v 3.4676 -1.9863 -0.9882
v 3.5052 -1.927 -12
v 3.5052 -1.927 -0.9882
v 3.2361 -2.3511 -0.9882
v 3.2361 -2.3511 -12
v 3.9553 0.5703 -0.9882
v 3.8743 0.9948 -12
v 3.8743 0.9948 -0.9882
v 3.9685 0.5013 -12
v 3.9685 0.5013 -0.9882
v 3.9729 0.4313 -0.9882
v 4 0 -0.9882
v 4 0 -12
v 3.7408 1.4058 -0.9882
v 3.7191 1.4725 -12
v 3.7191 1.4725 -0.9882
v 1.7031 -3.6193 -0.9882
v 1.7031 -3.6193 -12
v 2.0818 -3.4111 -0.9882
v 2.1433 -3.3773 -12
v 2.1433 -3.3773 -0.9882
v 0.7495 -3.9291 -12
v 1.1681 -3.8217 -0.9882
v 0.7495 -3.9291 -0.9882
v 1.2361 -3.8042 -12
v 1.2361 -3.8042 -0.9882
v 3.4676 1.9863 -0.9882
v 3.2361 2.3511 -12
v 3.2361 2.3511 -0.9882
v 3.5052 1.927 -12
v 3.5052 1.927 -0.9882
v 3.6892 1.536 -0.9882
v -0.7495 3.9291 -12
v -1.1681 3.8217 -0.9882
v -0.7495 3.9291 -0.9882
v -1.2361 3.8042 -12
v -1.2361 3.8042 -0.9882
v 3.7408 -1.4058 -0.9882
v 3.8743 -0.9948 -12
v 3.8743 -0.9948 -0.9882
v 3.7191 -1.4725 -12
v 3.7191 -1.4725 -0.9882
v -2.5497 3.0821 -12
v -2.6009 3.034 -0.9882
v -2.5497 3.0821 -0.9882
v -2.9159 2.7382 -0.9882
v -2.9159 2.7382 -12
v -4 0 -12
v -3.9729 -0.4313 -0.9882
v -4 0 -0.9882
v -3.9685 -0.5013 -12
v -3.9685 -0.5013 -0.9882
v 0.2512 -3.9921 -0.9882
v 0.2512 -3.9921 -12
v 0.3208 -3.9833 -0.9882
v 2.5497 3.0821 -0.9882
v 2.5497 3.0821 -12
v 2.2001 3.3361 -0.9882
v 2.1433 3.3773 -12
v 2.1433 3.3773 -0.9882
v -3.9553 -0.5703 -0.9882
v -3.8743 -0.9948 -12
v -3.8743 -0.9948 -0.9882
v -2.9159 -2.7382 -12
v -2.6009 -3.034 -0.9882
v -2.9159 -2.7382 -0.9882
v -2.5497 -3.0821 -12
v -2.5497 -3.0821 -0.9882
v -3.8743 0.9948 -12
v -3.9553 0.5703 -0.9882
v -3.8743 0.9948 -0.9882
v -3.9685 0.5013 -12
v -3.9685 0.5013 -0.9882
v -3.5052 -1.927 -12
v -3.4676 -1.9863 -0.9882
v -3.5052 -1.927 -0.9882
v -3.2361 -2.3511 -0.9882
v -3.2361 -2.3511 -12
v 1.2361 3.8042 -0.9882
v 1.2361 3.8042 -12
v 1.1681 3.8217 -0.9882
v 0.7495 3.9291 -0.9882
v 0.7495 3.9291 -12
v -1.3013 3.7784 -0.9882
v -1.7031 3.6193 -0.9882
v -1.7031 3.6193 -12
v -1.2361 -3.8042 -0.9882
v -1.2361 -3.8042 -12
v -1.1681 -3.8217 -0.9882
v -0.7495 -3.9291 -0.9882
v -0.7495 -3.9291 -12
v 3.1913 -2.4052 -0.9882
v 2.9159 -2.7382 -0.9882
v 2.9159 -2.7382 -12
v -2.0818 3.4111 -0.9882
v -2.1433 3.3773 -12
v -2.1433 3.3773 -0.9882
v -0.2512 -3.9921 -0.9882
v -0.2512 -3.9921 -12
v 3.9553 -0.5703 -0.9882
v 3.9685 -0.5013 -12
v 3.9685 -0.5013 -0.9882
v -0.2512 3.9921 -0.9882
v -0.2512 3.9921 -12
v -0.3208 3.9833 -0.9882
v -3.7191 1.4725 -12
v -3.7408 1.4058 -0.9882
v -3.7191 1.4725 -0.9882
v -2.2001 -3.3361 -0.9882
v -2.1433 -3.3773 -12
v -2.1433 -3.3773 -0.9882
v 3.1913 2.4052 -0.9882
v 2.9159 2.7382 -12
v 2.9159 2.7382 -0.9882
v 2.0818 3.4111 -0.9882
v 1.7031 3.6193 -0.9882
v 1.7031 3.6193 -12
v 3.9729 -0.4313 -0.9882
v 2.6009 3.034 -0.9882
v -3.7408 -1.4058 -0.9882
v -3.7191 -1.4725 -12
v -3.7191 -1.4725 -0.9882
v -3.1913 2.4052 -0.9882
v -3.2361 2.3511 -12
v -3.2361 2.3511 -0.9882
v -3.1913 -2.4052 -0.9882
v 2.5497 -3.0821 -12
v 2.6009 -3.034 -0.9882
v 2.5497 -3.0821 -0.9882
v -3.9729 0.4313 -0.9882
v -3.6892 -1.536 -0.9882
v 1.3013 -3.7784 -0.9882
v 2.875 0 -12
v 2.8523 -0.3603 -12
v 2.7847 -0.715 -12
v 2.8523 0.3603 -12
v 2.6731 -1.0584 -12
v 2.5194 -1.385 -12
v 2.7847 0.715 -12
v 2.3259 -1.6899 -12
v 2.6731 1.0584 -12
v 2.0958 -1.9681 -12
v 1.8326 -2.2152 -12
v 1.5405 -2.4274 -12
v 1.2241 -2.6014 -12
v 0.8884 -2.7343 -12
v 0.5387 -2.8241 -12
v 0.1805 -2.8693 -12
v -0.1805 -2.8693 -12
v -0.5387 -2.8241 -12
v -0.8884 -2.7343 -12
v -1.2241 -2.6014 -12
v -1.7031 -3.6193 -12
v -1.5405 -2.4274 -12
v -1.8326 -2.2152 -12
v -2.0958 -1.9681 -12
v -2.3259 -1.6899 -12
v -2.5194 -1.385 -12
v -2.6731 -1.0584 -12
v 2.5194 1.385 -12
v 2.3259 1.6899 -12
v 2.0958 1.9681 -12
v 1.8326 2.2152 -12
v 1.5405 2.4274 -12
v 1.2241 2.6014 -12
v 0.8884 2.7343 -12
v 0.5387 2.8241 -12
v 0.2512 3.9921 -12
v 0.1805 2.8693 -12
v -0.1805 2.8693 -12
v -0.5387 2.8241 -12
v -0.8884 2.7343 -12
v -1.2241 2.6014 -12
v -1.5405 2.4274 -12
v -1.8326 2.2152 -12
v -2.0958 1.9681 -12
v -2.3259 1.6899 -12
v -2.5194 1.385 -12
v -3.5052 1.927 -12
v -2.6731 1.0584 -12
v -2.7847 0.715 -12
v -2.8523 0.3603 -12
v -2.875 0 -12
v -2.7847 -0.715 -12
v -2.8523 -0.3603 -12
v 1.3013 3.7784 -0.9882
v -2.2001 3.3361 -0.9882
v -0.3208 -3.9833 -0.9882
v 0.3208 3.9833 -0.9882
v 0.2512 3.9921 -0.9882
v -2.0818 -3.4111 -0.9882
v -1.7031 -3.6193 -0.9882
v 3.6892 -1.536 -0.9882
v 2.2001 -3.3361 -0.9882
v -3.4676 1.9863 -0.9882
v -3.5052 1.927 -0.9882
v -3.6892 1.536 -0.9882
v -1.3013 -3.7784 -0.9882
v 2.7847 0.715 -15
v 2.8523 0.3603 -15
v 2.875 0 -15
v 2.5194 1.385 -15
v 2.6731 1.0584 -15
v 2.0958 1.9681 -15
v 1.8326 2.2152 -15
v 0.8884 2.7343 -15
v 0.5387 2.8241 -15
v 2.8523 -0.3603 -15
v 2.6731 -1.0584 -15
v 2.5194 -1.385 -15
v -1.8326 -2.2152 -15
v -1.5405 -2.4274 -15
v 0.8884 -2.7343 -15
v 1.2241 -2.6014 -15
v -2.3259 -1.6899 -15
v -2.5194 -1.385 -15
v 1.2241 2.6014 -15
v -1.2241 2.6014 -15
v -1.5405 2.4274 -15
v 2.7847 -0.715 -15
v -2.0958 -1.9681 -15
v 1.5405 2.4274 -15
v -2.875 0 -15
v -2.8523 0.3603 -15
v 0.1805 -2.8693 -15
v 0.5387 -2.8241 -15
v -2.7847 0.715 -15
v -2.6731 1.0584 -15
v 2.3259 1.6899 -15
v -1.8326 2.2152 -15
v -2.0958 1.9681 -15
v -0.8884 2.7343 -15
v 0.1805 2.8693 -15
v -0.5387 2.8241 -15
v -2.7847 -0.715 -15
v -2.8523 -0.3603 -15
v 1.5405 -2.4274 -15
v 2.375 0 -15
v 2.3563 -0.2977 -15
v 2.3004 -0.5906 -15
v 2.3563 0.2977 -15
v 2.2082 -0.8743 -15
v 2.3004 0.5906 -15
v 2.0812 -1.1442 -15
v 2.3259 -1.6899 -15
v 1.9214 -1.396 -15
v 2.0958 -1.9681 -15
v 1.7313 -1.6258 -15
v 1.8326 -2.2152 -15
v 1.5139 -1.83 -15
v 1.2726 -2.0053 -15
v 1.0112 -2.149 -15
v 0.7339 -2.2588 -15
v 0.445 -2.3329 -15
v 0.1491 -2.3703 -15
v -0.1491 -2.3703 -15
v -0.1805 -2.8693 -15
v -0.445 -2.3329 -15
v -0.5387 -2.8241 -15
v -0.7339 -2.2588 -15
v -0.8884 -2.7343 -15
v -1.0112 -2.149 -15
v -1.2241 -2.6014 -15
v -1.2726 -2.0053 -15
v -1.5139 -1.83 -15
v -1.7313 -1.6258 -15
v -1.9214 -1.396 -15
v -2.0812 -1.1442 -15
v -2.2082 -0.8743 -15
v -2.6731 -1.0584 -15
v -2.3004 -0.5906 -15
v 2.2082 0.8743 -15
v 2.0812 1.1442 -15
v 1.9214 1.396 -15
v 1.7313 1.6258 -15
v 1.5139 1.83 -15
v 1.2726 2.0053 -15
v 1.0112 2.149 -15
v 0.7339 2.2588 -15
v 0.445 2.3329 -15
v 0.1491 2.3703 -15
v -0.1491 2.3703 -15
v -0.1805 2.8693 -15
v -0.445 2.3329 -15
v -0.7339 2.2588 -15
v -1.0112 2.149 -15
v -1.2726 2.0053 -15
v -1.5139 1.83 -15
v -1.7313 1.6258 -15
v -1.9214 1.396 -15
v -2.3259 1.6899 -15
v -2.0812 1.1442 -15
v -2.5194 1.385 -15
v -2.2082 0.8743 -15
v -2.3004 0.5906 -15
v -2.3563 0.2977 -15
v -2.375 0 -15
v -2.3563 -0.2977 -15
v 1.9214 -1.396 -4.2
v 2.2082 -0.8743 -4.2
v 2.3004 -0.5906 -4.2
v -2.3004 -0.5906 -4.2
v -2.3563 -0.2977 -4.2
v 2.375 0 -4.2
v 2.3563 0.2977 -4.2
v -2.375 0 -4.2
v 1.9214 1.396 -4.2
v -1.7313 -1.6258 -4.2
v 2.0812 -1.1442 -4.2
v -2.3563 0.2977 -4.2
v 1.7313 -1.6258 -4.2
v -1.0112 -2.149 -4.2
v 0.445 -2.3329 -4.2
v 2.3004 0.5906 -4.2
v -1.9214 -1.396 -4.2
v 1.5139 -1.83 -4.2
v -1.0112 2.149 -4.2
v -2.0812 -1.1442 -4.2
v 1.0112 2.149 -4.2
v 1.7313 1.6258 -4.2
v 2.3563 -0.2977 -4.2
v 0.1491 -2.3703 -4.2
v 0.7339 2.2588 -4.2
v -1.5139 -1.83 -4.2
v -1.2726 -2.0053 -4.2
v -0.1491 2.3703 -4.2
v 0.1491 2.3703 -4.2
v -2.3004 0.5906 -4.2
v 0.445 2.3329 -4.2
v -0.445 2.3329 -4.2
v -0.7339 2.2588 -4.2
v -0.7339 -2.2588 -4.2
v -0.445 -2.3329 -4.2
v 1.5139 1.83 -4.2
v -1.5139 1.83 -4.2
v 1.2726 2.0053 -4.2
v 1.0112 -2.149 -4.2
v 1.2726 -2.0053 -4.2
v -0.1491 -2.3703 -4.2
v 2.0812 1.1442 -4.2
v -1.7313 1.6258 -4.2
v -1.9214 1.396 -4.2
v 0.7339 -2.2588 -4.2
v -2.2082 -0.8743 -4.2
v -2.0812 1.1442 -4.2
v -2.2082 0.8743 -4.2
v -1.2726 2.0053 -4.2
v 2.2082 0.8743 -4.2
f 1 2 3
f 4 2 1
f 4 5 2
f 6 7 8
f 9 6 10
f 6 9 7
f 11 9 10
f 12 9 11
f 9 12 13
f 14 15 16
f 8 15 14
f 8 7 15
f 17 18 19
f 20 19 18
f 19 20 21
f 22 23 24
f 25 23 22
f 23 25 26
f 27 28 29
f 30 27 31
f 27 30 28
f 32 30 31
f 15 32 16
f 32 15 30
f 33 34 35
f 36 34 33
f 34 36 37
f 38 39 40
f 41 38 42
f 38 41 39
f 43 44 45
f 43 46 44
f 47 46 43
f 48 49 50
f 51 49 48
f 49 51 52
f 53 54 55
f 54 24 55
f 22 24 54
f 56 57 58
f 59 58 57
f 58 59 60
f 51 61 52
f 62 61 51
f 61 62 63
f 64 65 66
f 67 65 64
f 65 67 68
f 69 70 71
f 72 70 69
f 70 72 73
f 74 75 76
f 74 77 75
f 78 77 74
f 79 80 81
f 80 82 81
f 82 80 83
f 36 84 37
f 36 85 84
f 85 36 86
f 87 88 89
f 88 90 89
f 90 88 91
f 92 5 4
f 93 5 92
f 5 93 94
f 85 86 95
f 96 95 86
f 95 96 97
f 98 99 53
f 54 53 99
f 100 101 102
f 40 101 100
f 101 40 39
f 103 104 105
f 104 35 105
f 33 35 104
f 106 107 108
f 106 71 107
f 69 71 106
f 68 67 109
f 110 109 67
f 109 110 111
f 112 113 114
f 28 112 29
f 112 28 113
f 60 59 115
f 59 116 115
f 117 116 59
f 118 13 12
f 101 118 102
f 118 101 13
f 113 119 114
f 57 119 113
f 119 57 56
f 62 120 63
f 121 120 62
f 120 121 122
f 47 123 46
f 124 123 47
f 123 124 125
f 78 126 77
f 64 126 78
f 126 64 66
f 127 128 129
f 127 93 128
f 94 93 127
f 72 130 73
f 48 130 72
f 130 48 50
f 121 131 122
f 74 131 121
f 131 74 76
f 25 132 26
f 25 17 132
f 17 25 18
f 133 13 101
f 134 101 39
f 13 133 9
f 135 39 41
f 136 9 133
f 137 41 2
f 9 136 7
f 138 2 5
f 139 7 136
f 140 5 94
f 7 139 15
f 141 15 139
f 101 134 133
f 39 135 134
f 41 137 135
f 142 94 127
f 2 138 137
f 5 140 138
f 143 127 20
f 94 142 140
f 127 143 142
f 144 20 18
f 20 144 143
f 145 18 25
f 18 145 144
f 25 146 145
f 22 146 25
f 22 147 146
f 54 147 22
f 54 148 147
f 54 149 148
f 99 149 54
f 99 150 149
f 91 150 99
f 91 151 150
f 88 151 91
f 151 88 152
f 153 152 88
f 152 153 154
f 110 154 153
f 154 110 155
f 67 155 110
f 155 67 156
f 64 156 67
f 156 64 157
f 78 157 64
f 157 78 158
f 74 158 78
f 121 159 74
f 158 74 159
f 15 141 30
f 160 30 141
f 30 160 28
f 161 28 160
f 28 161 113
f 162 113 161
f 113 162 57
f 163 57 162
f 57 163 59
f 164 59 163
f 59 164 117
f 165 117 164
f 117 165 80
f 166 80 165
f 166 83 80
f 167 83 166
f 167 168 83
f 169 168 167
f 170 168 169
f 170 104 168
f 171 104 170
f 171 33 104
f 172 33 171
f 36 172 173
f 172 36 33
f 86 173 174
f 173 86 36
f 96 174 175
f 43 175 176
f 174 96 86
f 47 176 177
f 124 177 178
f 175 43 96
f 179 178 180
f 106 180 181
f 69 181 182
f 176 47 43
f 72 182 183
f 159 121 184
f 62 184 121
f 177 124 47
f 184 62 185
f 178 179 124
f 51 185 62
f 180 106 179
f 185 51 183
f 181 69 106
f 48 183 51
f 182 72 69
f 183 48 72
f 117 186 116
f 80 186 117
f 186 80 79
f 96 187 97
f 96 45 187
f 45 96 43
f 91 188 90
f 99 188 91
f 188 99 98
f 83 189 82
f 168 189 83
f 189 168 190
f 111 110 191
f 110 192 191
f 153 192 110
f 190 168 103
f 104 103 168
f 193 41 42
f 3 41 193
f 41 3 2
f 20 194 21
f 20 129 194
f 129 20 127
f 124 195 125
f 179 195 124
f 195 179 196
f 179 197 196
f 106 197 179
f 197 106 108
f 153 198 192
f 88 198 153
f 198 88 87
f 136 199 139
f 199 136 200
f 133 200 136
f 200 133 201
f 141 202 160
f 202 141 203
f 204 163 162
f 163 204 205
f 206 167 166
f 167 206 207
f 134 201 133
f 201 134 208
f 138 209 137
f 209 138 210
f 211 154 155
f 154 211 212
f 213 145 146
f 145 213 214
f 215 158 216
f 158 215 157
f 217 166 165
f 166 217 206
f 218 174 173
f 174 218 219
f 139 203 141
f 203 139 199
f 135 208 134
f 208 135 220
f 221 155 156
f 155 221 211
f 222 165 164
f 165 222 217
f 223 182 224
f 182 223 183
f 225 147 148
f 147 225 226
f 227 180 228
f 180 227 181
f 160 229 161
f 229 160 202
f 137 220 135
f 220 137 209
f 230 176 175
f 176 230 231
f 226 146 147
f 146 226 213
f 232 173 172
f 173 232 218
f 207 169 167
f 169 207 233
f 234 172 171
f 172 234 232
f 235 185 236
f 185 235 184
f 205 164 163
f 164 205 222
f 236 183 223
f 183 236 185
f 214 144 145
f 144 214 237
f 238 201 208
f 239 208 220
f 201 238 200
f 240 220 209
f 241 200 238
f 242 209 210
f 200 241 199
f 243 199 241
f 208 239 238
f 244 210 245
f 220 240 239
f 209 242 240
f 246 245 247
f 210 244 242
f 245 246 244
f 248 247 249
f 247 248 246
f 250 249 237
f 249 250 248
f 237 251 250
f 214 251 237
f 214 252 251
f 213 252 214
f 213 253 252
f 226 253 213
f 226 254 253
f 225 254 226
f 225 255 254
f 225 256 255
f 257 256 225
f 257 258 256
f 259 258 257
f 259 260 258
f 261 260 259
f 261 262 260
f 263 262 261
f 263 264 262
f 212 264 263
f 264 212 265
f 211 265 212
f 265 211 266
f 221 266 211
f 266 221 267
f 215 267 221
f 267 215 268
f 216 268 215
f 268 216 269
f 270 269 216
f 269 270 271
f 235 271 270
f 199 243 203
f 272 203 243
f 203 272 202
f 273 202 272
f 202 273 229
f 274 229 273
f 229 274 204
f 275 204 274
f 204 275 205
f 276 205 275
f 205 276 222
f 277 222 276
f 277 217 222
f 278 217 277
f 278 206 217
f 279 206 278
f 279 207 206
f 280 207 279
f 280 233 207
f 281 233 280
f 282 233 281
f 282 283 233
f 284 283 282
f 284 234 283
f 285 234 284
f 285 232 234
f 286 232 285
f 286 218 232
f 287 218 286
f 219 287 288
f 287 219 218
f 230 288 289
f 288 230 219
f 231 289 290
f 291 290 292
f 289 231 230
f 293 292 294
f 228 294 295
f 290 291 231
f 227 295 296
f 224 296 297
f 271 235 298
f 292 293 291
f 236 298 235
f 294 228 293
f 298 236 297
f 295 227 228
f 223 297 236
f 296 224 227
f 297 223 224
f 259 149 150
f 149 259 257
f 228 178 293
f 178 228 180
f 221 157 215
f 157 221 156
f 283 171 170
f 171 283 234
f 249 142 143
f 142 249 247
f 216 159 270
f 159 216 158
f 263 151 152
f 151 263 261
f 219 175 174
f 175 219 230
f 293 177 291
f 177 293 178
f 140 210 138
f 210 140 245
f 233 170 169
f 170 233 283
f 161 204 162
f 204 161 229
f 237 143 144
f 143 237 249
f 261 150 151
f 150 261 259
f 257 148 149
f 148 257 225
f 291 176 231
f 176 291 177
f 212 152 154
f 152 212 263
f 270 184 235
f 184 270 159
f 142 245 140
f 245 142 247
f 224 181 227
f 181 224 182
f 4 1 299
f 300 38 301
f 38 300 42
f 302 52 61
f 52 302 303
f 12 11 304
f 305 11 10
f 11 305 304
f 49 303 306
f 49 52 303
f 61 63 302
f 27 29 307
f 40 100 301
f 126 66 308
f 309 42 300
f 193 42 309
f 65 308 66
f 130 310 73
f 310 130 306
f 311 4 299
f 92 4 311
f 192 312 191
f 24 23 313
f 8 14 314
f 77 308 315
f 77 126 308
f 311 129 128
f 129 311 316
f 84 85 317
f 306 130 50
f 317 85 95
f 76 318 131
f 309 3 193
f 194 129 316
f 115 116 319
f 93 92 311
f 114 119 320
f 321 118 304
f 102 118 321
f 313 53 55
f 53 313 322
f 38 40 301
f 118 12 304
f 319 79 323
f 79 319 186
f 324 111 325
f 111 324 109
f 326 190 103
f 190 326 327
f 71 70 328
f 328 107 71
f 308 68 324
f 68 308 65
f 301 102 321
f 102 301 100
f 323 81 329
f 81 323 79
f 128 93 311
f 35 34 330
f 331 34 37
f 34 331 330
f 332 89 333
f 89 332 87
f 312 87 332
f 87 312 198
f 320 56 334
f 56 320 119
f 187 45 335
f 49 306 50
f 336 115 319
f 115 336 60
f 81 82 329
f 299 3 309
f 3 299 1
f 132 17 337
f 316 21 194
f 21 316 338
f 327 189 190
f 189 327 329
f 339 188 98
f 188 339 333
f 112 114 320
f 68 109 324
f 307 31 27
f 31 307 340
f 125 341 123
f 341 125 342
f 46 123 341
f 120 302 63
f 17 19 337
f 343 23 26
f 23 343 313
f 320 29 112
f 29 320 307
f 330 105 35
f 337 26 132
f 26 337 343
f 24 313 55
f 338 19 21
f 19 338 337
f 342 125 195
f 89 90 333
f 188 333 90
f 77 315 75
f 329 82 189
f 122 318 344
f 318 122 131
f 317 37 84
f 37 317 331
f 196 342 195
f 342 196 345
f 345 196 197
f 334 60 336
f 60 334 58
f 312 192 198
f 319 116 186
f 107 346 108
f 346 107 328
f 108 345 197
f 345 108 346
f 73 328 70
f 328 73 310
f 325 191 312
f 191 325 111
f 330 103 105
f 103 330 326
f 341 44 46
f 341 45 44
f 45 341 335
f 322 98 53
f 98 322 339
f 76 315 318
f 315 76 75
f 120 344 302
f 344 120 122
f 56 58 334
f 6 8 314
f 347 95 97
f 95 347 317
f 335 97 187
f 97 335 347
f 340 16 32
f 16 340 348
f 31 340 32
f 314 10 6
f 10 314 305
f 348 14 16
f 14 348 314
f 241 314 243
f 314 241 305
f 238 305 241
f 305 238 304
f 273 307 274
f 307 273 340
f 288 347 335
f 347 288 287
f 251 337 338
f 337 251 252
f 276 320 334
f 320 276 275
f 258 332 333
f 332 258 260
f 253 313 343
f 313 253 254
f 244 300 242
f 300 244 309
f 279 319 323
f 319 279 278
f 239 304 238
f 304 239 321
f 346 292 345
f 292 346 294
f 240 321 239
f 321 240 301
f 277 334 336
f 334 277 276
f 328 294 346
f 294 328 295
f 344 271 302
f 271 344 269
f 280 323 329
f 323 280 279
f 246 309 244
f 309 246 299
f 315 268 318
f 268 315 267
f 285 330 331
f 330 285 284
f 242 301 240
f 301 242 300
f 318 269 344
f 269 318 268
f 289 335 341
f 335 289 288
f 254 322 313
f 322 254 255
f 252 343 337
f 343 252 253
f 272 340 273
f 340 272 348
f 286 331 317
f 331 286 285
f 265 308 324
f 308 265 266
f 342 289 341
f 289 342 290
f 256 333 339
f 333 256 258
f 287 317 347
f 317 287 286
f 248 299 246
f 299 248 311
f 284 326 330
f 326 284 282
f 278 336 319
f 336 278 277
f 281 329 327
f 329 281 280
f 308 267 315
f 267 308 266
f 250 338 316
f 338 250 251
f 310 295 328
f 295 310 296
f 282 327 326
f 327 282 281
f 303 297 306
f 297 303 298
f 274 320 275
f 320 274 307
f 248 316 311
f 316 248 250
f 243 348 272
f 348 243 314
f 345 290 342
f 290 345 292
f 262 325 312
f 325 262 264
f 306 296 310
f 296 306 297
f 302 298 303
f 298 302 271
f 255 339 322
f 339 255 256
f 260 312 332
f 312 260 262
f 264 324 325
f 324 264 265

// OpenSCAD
$fn = 50;

difference() {
	union() {
		translate(v = [0, 0, -12.0]) {
			cylinder(h = 15, r = 4.0);
		}
		#translate(v = [0, 0, -15.0]) {
			cylinder(h = 15, r = 2.875);
		}
	}
	union() {
		translate(v = [0, 0, 0]) {
			rotate(a = [0, 0, 0]) {
				difference() {
					union() {
						translate(v = [0, 0, -15.0]) {
							cylinder(h = 15, r = 2.25);
						}
						translate(v = [0, 0, -4.2]) {
							cylinder(h = 4.2, r1 = 2.375, r2 = 4.5);
						}
						translate(v = [0, 0, -15.0]) {
							cylinder(h = 15, r = 2.375);
						}
						translate(v = [0, 0, -15.0]) {
							cylinder(h = 15, r = 2.25);
						}
					}
					union();
				}
			}
		}
		#cylinder(h = 3, r = 5.0);
	}
}
